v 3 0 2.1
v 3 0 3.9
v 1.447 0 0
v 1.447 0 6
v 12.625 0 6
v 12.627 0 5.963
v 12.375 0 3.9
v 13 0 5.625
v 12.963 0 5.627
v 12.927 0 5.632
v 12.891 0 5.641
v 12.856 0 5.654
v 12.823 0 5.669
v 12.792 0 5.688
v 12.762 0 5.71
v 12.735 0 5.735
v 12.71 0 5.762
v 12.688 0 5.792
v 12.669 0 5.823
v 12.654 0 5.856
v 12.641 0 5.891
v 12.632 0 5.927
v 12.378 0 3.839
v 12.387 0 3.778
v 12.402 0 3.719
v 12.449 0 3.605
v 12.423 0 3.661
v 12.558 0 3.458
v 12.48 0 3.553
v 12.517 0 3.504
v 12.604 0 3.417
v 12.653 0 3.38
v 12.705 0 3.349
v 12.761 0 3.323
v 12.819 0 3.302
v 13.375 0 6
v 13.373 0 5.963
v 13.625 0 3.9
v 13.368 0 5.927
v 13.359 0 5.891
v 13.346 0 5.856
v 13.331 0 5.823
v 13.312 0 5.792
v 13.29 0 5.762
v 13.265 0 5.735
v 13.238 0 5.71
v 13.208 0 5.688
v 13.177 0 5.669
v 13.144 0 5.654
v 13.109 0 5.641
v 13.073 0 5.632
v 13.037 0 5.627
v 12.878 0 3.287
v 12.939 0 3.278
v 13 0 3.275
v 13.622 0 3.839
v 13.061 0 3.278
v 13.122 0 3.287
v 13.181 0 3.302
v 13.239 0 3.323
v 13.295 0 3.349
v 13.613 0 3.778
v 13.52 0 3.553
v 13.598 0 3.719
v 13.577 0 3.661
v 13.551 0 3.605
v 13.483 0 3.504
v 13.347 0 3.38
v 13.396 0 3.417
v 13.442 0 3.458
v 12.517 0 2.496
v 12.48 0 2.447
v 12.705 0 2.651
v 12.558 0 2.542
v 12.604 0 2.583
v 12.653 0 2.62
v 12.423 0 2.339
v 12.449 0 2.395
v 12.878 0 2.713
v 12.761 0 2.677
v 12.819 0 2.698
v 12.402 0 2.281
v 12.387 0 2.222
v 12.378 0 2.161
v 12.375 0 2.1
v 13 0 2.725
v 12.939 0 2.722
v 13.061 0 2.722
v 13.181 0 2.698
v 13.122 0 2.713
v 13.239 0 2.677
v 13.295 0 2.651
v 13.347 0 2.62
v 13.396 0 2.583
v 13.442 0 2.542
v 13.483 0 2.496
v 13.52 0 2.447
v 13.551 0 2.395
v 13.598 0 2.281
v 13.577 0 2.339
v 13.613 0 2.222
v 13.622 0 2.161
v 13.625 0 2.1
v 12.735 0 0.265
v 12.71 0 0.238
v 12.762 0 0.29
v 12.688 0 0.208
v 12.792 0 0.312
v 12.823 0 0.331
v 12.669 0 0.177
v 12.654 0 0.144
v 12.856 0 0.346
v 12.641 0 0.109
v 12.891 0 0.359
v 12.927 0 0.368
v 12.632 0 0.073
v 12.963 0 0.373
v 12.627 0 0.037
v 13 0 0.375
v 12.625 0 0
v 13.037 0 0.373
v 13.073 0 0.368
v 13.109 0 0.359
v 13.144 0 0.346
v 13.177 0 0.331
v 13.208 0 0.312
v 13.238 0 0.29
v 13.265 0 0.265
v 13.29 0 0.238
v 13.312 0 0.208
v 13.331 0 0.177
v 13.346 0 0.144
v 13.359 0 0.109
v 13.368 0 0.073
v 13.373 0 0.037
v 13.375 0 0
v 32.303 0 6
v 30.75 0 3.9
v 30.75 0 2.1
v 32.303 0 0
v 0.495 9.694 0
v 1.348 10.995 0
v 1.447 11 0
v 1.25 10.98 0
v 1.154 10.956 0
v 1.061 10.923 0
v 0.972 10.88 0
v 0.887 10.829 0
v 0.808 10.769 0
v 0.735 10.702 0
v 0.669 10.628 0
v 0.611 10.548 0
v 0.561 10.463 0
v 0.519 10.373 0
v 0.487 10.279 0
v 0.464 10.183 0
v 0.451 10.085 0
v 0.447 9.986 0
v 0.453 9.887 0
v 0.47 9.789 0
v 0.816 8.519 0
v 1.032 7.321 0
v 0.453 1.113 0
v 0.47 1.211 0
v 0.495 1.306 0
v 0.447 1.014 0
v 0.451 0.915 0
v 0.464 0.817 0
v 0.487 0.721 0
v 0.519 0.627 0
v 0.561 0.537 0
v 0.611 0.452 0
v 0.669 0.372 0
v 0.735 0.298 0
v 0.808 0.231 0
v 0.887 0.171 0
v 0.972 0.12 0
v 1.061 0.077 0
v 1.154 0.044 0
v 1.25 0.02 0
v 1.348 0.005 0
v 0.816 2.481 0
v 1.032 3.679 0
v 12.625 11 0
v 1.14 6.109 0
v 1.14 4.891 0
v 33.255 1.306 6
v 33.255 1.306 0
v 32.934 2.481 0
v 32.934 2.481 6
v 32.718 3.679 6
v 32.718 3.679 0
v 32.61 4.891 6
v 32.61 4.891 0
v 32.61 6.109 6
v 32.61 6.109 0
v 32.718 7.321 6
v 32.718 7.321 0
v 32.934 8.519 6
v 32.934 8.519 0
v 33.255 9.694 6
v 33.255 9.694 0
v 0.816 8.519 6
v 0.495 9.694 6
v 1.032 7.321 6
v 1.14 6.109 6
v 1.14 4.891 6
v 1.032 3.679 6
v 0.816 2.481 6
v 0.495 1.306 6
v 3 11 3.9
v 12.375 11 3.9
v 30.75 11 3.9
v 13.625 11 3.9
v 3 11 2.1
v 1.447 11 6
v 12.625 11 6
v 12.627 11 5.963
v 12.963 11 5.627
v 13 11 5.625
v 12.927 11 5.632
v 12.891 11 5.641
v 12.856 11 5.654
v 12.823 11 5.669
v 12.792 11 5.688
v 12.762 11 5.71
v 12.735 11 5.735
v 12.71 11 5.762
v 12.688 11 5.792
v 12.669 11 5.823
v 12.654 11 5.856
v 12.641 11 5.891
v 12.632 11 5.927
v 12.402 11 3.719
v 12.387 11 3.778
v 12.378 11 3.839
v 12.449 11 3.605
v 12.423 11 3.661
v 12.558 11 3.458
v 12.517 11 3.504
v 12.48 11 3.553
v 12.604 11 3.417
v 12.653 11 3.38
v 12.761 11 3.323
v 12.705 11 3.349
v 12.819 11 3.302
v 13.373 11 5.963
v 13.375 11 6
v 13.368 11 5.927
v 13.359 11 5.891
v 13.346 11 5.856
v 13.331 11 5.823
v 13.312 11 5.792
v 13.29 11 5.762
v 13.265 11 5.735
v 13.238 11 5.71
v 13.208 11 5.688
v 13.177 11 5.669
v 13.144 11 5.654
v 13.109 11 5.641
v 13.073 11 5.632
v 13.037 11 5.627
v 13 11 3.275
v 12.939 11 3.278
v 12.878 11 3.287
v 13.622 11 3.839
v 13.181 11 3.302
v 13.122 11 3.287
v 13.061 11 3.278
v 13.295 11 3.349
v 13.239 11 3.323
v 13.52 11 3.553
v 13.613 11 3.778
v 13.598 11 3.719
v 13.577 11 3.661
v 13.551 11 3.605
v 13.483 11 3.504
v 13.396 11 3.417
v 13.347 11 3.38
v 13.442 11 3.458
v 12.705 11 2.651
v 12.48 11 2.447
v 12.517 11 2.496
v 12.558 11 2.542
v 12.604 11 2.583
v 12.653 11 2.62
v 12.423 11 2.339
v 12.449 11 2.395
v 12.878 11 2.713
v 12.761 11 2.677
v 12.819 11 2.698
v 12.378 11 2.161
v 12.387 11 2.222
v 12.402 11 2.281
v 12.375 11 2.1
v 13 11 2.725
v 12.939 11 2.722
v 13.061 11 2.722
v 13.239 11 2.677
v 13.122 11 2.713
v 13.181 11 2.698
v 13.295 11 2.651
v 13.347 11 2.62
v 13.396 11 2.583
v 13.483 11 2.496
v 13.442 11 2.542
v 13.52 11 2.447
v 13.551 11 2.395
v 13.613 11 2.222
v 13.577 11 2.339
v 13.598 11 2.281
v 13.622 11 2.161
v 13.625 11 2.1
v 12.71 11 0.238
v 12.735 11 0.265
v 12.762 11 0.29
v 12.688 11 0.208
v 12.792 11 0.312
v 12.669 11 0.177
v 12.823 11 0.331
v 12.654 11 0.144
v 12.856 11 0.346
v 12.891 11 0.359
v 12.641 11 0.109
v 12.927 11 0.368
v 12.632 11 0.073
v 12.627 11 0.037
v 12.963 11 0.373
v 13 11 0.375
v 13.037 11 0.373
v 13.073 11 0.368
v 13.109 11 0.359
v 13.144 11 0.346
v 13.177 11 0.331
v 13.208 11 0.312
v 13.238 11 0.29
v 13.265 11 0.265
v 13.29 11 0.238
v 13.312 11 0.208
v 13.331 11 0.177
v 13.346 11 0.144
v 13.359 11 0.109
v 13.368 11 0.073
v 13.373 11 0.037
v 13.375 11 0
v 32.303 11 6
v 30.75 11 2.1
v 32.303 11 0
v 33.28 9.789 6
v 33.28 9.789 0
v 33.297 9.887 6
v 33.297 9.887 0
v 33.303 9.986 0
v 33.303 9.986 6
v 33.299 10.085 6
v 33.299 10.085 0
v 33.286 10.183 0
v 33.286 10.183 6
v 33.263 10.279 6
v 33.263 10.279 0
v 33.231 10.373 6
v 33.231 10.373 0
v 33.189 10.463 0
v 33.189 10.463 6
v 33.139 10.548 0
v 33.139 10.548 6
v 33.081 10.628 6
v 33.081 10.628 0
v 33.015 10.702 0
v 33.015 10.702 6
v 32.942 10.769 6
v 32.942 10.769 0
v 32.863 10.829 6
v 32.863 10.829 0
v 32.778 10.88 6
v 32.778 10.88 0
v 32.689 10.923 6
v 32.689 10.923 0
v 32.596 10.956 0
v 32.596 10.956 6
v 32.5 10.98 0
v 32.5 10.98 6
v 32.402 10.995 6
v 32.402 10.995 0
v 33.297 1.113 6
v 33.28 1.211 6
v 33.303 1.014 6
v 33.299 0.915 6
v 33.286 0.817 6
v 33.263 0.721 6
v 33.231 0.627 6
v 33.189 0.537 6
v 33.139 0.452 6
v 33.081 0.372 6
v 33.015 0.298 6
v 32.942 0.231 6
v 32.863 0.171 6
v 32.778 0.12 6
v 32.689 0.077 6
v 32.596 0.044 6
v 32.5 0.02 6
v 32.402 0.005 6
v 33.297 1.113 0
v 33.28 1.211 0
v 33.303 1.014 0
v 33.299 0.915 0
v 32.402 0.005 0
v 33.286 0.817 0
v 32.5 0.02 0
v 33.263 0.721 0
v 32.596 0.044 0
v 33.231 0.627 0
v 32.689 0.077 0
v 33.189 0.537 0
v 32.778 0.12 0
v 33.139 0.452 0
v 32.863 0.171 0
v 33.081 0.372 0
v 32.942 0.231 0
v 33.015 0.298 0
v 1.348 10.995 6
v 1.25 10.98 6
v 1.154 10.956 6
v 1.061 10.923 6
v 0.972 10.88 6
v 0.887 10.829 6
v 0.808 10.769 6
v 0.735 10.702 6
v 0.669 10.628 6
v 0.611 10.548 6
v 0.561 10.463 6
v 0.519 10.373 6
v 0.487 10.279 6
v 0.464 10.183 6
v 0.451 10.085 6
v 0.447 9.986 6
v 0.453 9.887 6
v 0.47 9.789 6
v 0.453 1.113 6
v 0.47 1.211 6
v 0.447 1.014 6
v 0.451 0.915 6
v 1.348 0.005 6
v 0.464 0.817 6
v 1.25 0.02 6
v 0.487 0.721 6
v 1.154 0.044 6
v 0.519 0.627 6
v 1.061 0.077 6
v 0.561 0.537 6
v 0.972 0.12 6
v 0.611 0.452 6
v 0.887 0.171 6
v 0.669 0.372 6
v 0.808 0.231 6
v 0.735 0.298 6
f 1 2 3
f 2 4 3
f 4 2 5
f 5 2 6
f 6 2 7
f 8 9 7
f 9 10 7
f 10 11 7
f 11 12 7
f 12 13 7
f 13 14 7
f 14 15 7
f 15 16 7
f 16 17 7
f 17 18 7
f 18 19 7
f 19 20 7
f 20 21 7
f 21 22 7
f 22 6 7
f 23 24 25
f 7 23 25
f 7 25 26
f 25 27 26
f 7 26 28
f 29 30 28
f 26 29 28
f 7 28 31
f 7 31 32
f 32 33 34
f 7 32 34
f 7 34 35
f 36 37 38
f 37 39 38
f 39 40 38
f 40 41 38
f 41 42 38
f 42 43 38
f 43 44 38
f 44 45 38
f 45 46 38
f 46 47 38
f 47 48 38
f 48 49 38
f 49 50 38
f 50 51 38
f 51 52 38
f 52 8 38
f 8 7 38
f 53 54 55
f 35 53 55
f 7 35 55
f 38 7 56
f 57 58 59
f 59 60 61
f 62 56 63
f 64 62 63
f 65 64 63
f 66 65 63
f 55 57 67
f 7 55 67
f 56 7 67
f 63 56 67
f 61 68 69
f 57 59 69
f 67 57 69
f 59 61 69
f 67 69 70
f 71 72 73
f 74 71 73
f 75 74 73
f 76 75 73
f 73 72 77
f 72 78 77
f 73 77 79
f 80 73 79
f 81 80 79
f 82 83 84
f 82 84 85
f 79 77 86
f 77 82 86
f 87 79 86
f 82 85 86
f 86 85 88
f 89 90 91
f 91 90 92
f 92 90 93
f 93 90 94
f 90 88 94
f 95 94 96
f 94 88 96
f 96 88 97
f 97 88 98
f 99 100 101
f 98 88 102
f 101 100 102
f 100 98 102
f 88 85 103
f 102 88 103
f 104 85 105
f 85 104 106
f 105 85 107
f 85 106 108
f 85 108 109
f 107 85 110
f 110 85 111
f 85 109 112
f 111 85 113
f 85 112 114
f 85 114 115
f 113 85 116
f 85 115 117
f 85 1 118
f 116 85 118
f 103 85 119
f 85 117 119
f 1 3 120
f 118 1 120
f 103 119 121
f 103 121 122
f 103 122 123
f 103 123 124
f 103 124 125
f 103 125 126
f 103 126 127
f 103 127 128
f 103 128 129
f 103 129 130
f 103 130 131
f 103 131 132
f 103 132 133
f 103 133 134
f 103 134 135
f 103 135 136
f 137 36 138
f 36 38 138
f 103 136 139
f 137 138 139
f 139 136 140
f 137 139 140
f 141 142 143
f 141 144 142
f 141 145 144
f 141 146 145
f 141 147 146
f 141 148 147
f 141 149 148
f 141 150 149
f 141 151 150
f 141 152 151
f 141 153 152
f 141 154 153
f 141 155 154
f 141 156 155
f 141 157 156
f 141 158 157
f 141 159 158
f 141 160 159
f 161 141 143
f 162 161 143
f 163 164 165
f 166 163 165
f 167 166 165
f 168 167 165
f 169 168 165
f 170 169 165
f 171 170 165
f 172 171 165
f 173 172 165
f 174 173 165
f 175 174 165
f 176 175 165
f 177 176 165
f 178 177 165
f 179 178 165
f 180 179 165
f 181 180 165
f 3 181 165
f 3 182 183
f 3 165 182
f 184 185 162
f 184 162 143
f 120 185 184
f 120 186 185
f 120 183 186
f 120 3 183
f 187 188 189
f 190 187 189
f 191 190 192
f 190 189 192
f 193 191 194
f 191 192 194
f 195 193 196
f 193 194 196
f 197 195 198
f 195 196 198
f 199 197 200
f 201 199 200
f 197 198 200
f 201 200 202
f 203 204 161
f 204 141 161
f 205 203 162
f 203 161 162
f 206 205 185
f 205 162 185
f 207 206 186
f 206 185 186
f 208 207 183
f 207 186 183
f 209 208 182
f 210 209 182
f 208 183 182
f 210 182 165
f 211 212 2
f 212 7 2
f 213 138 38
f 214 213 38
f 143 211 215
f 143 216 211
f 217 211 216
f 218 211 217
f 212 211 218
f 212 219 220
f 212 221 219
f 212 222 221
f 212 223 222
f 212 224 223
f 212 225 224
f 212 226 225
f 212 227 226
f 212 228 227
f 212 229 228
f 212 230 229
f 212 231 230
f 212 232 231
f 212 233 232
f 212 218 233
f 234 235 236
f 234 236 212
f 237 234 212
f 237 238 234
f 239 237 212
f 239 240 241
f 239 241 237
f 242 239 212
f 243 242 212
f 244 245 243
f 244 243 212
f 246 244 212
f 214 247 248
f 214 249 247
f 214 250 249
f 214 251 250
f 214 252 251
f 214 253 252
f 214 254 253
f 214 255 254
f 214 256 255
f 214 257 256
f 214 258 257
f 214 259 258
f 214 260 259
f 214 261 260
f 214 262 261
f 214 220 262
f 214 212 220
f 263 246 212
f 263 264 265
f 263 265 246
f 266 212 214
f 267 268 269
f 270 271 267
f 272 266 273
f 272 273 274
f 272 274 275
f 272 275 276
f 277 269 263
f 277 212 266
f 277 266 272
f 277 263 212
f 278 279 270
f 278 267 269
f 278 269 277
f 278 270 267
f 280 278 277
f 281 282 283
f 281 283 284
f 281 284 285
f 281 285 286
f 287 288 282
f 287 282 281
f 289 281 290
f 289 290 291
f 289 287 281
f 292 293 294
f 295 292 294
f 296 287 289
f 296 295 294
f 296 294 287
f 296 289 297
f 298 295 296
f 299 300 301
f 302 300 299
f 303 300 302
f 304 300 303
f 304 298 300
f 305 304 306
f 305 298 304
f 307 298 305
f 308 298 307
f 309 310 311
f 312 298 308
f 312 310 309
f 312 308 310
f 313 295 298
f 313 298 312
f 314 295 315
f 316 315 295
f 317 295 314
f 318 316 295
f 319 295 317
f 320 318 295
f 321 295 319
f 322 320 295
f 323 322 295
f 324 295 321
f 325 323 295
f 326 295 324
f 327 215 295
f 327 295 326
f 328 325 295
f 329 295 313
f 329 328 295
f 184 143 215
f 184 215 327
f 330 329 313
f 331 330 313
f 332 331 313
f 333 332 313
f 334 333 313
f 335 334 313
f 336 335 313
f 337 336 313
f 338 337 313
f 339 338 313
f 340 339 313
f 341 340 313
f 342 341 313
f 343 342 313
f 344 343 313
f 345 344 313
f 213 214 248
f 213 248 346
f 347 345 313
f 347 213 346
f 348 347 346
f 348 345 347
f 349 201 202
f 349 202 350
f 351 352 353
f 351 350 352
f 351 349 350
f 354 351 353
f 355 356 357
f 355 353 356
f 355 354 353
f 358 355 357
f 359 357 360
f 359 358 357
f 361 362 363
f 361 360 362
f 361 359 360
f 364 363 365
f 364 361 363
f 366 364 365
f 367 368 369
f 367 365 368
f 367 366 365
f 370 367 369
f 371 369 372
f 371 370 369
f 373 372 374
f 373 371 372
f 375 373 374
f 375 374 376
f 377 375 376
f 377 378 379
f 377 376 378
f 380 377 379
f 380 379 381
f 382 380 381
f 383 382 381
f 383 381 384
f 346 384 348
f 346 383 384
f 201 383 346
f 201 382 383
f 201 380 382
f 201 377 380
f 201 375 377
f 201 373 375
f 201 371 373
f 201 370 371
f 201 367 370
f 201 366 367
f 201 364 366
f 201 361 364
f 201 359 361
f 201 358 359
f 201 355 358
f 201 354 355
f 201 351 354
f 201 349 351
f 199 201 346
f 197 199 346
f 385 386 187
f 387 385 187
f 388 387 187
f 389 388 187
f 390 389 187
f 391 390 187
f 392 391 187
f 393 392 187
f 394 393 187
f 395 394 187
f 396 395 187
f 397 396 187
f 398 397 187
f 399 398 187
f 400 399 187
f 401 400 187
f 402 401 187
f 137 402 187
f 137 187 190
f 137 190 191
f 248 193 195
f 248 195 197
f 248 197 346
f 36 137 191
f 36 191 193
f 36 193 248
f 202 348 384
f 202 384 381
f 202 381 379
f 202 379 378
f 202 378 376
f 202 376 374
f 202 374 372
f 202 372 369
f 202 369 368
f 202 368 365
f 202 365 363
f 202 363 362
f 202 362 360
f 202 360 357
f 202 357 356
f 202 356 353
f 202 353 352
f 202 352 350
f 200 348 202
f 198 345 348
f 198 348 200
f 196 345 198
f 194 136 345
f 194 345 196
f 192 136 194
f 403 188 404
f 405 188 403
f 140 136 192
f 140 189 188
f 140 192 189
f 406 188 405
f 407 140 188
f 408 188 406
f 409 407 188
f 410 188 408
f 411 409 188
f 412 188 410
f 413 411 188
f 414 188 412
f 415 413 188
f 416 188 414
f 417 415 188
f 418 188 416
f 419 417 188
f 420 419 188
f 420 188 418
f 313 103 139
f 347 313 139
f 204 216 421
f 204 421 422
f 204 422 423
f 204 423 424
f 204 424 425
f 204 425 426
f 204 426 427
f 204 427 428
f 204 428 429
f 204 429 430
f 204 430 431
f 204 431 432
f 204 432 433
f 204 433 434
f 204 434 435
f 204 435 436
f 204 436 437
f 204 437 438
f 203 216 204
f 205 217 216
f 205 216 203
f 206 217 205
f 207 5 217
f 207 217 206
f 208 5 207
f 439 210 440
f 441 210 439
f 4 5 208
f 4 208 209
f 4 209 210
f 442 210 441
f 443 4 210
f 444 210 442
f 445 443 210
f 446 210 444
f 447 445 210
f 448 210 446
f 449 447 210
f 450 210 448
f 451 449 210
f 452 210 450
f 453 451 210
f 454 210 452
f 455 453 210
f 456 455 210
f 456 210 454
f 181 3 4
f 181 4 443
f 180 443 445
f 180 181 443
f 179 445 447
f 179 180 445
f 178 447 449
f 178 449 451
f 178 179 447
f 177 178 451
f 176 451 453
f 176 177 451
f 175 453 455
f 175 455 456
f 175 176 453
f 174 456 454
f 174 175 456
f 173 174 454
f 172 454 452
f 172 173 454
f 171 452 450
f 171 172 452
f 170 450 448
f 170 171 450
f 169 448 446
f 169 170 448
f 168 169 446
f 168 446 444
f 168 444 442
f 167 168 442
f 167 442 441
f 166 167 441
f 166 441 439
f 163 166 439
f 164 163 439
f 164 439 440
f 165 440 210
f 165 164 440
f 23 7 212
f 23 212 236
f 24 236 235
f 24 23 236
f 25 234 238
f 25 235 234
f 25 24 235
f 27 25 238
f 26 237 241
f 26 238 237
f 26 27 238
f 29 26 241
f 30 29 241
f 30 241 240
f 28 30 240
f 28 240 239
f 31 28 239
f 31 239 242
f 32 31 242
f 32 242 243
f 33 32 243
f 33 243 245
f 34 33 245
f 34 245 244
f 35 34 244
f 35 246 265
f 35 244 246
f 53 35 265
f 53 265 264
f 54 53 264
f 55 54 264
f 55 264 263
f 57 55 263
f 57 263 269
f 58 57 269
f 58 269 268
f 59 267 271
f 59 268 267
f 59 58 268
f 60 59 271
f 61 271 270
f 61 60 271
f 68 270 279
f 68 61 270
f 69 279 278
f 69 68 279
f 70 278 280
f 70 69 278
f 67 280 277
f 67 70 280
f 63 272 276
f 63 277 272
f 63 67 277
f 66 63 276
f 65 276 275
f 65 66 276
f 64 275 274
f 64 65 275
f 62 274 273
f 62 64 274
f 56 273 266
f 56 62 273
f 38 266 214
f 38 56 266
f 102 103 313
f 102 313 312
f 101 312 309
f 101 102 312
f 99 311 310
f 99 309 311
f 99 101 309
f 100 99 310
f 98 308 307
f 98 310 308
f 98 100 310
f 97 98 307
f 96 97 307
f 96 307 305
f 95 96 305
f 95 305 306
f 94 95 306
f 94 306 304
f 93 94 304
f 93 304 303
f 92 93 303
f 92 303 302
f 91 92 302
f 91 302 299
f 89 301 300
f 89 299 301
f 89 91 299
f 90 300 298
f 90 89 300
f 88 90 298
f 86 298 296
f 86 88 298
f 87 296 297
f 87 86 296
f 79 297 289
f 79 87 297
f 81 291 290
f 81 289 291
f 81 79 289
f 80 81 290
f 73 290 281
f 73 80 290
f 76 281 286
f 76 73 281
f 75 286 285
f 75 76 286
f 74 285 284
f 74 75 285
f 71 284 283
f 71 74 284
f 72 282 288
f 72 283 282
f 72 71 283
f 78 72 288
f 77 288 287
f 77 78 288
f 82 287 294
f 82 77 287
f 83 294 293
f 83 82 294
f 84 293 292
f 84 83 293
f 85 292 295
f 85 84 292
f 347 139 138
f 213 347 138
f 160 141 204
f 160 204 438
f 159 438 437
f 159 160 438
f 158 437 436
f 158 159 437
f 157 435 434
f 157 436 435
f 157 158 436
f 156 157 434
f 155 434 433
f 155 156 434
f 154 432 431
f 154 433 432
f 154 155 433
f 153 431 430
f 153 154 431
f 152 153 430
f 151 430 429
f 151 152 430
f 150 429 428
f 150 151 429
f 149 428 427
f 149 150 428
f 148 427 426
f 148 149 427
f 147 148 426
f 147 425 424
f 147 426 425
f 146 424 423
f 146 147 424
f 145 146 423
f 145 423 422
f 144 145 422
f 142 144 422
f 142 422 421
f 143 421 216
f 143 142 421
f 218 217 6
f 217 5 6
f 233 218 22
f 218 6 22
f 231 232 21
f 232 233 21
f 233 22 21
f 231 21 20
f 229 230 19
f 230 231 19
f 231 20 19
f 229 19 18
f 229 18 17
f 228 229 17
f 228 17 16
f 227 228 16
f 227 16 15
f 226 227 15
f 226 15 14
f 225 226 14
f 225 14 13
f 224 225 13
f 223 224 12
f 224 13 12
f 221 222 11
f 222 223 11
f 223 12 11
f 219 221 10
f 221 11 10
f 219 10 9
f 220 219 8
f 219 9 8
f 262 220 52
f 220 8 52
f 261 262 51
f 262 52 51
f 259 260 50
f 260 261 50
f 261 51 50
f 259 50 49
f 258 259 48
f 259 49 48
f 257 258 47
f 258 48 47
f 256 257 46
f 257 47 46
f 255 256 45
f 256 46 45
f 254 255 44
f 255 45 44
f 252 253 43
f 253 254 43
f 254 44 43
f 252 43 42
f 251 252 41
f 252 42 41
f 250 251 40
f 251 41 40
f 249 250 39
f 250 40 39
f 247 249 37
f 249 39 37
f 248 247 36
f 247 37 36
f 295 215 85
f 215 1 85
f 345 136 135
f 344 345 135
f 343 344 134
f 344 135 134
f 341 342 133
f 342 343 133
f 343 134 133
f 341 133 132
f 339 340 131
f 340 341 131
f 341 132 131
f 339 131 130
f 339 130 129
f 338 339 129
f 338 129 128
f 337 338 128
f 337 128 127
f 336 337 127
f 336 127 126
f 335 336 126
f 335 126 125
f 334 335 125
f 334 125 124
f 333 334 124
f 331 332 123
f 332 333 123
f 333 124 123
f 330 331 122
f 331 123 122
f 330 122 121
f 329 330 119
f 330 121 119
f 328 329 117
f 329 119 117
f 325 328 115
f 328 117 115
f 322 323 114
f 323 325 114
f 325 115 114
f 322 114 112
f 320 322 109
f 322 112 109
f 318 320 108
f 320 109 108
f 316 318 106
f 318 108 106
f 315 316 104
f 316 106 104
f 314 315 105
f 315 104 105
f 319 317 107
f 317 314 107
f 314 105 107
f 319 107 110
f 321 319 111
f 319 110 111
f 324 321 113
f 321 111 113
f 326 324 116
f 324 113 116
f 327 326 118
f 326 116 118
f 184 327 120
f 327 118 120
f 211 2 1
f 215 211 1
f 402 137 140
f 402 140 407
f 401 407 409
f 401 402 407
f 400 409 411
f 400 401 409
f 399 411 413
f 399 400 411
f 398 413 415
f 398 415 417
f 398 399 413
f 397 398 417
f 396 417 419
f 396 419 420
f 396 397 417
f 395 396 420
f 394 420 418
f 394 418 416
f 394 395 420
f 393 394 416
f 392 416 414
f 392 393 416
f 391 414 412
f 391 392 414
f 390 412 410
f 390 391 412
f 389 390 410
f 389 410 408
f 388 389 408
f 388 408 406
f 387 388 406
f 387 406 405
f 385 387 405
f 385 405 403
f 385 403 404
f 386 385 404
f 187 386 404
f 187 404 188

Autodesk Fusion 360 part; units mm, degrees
sketch "Sketch1" plane through (0, 0, 0) normal (0, 1, 0) x (1, 0, 0)
  line L0 (0, 0) -> (33.75, 0)
  line L1 (33.75, 0) -> (33.75, -6)
  line L2 (33.75, -6) -> (0, -6)
  line L3 (0, -6) -> (0, 0)
  line L4 (3, -3.9) -> (3, -2.1)
  line L5 (30.75, -2.1) -> (30.75, -3.9)
  line L6 (30.75, -3.9) -> (13.625, -3.9)
  line L7 (12.375, -3.9) -> (3, -3.9)
  line L8 (3, -2.1) -> (12.375, -2.1)
  line L9 (13.625, -2.1) -> (30.75, -2.1)
  arc A0 (12.375, -2.1) -> (13.625, -2.1) centre (13, -2.1) ccw
  arc A1 (12.625, 0) -> (13.375, 0) centre (13, 0) ccw
  arc A2 (13.375, -6) -> (12.625, -6) centre (13, -6) ccw
  arc A3 (13.625, -3.9) -> (12.375, -3.9) centre (13, -3.9) ccw
  dimension "d1" = 33.75
  dimension "d2" = 6
  dimension "d8" = 2.1
  dimension "d9" = 3
  dimension "d10" = 2.1
  dimension "d11" = 3
  dimension "d12" = 27
  dimension "d20" = 10
  dimension "d22" = 10
  dimension "d25" = 0.75
  dimension "d26" = 0.75
  dimension "d27" = 0.625
  dimension "d33" = 1.25
extrude "Extrude1" add sketch "Sketch1" along normal blind 11
sketch "Sketch2" plane through (0, 0, 0) normal (0, 0, -1) x (-1, 0, 0)
  line L0 (-33.75, 0) -> (0, 0)
  line L1 (0, 0) -> (0, 11)
  line L2 (0, 11) -> (-33.75, 11)
  line L3 (-33.75, 11) -> (-33.75, 0)
  arc A0 (0, 11) -> (0, 0) centre (12.5393, 5.5) ccw
  line L4 (0, 11) -> (0, 0)
  line L5 (-16.875, 11) -> (-16.875, 0)
  line L6 (-33.75, 11) -> (-33.75, 0)
  arc A1 (-33.75, 0) -> (-33.75, 11) centre (-46.2893, 5.5) ccw
  line L7 (-33.75, 0) -> (-33.75, 11)
extrude "Extrude2" cut sketch "Sketch2" against normal through all contours L3 L6 A1 L7 | L1 A0 L4
fillet "Fillet1" radius 1 2 edges at (0, 11, 3) (0, 0, 3)
fillet "Fillet1" radius 1 2 edges at (33.75, 11, 3) (33.75, 0, 3)
sketch "Sketch3" plane through (0, 11, 0) normal (0, 1, 0) x (-1, 0, 0)
  line L0 (-32.3029, 6) -> (-32.3029, 0)
  line L1 (-32.3029, 0) -> (-1.4471, 0)
  line L2 (-1.4471, 0) -> (-1.4471, 6)
  line L3 (-1.4471, 6) -> (-32.3029, 6)
  line L4 (-30.75, 3.9) -> (-13.625, 3.9)
  line L5 (-3, 3.9) -> (-3, 2.1)
  line L6 (-3, 2.1) -> (-12.375, 2.1)
  arc A0 (-12.375, 2.1) -> (-13.625, 2.1) centre (-13, 2.1) ccw
  line L7 (-13.625, 2.1) -> (-30.75, 2.1)
  line L8 (-30.75, 2.1) -> (-30.75, 3.9)
  circle A1 centre (-13, 0) radius 0.375
  circle A2 centre (-13, 6) radius 0.375
  arc A3 (-13.625, 3.9) -> (-12.375, 3.9) centre (-13, 3.9) ccw
  line L9 (-12.375, 3.9) -> (-3, 3.9)
  dimension "d28" = 0.75
  dimension "d29" = 0.75
  dimension "d30" = 10
  dimension "d31" = 10
extrude "Extrude3" cut sketch "Sketch3" against normal through all contours L3 A2 | L1 A1 picked at (-13.0916, 5.915) picked at (-12.9084, 0.085)
equation "d8 = d10"
equation "d11 = d9"
equation "d24 = 0.75 mm"
equation "d25 = d24"
equation "d26 = d24"
equation "d27 = d33 / 2"
equation "d31 = d30"
